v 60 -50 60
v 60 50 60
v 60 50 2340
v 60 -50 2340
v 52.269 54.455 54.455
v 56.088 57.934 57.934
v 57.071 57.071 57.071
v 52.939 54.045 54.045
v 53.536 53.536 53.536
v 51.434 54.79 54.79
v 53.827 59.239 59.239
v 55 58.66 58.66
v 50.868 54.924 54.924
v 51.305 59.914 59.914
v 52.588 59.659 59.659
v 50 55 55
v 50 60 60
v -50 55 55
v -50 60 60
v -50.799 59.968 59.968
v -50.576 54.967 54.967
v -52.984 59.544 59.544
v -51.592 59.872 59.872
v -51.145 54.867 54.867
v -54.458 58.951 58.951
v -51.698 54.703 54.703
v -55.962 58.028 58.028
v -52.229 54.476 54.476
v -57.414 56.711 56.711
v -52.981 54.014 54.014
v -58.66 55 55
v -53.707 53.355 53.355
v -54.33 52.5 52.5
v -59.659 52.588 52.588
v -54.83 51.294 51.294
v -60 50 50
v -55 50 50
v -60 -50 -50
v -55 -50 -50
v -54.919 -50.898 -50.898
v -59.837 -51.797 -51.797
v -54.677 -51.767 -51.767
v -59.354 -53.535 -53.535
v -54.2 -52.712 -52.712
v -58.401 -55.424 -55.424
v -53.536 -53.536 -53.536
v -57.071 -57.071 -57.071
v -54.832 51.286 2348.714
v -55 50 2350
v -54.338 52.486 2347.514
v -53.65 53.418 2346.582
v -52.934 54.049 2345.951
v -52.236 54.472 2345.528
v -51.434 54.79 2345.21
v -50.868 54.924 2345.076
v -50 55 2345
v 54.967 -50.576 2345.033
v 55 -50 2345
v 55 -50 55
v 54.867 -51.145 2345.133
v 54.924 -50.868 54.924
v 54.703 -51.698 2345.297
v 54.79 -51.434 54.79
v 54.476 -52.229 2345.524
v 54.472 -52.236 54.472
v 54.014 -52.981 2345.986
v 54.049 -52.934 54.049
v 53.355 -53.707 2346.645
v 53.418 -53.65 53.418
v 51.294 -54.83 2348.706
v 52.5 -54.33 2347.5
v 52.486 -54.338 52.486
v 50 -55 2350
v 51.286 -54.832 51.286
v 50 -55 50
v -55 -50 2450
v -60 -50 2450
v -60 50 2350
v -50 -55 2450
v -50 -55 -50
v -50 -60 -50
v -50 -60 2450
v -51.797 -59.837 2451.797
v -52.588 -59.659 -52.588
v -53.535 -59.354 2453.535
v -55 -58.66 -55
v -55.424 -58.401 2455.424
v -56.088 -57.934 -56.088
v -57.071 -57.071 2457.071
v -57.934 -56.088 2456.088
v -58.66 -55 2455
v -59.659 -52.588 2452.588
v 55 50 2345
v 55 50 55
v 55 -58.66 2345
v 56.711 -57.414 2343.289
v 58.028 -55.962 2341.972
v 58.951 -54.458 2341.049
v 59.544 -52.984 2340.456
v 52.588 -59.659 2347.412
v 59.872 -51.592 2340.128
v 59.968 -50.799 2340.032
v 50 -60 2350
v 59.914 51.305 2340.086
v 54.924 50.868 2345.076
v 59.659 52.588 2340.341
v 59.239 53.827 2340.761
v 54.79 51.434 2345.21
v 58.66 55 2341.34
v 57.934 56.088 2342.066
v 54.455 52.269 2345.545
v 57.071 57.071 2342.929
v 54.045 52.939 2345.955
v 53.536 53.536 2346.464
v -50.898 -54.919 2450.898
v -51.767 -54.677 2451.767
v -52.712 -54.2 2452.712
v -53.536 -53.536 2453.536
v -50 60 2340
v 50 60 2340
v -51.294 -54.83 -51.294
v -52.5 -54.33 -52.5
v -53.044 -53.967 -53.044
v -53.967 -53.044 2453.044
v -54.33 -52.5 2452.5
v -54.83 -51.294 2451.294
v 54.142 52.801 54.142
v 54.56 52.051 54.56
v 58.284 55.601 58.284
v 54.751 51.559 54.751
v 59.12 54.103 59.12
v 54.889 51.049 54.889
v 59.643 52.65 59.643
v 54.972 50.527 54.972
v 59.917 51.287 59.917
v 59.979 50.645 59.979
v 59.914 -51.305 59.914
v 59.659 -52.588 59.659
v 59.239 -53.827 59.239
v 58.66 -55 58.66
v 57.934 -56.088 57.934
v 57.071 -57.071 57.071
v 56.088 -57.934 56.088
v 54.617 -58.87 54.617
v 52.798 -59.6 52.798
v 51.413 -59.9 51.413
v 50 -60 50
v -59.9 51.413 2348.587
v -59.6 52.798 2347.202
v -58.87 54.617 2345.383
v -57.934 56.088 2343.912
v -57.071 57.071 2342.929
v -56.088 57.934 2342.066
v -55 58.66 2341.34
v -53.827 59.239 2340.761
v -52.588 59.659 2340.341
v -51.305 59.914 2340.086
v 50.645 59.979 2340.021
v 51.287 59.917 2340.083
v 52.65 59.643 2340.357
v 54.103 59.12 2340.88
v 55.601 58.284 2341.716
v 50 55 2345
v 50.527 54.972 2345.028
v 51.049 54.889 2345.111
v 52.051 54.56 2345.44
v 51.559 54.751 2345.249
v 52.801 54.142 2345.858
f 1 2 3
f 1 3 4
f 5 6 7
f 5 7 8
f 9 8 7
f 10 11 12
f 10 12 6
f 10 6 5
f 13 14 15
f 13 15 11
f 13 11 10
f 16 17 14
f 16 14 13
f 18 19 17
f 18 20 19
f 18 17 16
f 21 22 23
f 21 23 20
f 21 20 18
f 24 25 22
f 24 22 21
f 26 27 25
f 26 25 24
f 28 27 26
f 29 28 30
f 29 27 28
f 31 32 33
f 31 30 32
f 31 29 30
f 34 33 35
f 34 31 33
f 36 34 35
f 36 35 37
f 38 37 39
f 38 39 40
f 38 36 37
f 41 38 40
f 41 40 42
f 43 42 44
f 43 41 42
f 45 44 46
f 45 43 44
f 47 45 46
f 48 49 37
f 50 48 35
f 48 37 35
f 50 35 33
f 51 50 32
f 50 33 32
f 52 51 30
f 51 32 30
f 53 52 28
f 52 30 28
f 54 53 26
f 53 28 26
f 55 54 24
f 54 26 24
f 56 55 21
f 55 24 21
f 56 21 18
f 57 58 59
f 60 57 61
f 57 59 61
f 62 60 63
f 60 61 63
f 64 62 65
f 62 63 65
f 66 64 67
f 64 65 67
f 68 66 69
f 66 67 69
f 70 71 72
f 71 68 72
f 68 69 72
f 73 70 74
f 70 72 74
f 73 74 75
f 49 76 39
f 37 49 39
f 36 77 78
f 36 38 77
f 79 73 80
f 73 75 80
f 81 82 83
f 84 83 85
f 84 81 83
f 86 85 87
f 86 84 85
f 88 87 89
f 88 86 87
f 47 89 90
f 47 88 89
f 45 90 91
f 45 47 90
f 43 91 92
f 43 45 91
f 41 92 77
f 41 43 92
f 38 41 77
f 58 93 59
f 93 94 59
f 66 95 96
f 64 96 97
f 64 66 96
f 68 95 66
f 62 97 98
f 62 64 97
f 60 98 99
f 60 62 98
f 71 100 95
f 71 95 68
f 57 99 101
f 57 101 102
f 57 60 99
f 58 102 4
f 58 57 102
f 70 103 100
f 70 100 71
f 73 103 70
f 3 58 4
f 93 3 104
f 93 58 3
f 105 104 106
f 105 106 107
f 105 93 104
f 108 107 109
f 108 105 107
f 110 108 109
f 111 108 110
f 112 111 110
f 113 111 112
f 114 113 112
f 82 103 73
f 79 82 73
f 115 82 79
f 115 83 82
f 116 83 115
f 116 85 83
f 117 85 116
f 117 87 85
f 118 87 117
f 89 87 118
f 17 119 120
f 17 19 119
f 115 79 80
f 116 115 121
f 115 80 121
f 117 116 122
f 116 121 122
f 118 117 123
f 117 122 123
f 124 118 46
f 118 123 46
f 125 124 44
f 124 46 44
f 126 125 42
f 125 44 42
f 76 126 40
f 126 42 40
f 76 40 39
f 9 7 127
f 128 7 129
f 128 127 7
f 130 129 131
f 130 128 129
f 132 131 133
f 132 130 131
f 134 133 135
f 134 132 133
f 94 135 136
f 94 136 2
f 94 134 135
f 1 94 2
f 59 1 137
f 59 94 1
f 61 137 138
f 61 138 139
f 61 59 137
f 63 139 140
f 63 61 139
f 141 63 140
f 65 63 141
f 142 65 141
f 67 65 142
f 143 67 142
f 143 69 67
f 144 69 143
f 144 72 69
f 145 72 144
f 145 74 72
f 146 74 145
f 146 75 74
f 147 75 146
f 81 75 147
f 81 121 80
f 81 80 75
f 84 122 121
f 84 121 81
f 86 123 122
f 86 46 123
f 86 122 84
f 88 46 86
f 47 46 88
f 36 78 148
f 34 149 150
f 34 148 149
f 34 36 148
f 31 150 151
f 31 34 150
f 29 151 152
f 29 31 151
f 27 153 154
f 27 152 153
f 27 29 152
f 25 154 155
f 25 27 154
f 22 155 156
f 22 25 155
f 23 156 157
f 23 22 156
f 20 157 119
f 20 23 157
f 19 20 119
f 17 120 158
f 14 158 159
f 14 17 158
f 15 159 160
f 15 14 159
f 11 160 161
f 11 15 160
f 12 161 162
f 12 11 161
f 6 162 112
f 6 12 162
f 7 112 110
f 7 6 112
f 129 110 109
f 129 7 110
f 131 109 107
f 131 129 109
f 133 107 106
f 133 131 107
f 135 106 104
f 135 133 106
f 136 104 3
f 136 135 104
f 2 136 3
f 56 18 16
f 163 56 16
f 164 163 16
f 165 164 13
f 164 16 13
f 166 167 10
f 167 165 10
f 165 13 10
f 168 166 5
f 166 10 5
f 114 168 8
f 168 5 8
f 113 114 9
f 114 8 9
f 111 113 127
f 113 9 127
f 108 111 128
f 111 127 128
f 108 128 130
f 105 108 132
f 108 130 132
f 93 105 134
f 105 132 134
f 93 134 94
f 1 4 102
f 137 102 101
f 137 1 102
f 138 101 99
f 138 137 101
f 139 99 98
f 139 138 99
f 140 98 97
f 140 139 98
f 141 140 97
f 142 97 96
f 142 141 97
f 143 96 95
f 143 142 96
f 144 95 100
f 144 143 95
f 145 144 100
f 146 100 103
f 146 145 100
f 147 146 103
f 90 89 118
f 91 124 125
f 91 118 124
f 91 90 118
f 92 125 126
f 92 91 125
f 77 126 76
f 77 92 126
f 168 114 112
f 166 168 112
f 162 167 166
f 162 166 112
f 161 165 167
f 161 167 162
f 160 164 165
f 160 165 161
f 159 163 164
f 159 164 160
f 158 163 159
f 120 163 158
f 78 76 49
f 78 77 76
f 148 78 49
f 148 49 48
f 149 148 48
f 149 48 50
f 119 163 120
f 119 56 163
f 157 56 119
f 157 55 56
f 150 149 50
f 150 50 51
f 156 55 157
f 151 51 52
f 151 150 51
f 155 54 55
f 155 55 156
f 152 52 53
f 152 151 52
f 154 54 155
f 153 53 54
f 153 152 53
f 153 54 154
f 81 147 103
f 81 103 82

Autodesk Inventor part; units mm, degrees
ref_plane "Start Plane" through (0, 0, -57.0711) normal (0, 0, 1) x (1, 0, 0)
ref_plane "End Plane" through (0, 0, 2457.0711) normal (0, 0, 1) x (1, 0, 0)
sketch "Sketch" plane through (0, 0, 0) normal (0, 0, 1) x (1, 0, 0)
  line L0 (-60, -50) -> (-60, 50)
  line L1 (-50, 60) -> (50, 60)
  line L2 (60, 50) -> (60, -50)
  line L3 (50, -60) -> (-50, -60)
  arc A0 (-60, -50) -> (-50, -60) centre (-50, -50) ccw
  arc A1 (60, 50) -> (50, 60) centre (50, 50) ccw
  arc A2 (-50, 60) -> (-60, 50) centre (-50, 50) ccw
  arc A3 (50, -60) -> (60, -50) centre (50, -50) ccw
  arc A4 (-50, 55) -> (-55, 50) centre (-50, 50) ccw
  line L4 (-50, 55) -> (50, 55)
  arc A5 (55, 50) -> (50, 55) centre (50, 50) ccw
  line L5 (55, 50) -> (55, -50)
  arc A6 (50, -55) -> (55, -50) centre (50, -50) ccw
  line L6 (50, -55) -> (-50, -55)
  arc A7 (-55, -50) -> (-50, -55) centre (-50, -50) ccw
  line L7 (-55, -50) -> (-55, 50)
  line L8 (0, 86.8995) -> (0, -86.8995) construction
  line L9 (-86.8995, 0) -> (86.8995, 0) construction
  dimension "d7" = 10
  dimension "d9" = 120
  dimension "d11" = 120
  dimension "d12" = 5
  dimension "d15" = 60
  dimension "d16" = 60
extrude "Body" add sketch "Sketch" along normal up to surface (2514.1421 mm away) from surface at -57.0711
sketch "Sketch3" plane through (0, 0, 0) normal (0, 0, 1) x (1, 0, 0)
  line L0 (0, 0) -> (10, 0)
ref_plane "Work Plane3" through (0, 0, 0) normal (0, -1, 0) x (1, 0, 0)
ref_plane "Work Plane4" through (-60, 0, 2460) normal (0.7071, 0, 0.7071) x (0.7071, 0, -0.7071)
split "Split1" plane through (-60, 0, 2460) removes the side toward (0.7071, 0, 0.7071)
ref_plane "Work Plane5" through (0, -60, 2460) normal (0, 0.7071, 0.7071) x (1, 0, 0)
split "Split2" plane through (0, -60, 2460) removes the side toward (0, 0.7071, 0.7071)
ref_plane "Work Plane6" through (0, -60, -60) normal (0, 0.7071, -0.7071) x (1, 0, 0)
split "Split3" plane through (0, -60, -60) removes the side toward (0, 0.7071, -0.7071)
ref_plane "Work Plane7" through (-60, 0, -60) normal (0.7071, 0, -0.7071) x (-0.7071, 0, -0.7071)
split "Split4" plane through (-60, 0, -60) removes the side toward (0.7071, 0, -0.7071)
sketch "Sketch4" plane through (0, 0, 0) normal (0, -1, 0) x (1, 0, 0)
  line L0 (-2, -57.0711) -> (12, -57.0711) projected
  line L1 (-2, 2457.0711) -> (12, 2457.0711) projected
  dimension "d18" = 2514.1421
equation "\"d7\" = G_IR"
equation "\"d9\" = G_W"
equation "\"d11\" = G_H"
equation "\"d12\" = G_T"
equation "\"d15\" = 0.5 * d9"
equation "\"d16\" = 0.5 * d11"
equation "\"d3\" = G_L"
equation "\"G_W\" = 120"
equation "\"G_H\" = 120"
equation "\"G_T\" = 5"
equation "\"G_IR\" = 10"
equation "\"G_L\" = d18"
equation "\"G_OFFSET_START\" = 57.07107"
equation "\"G_OFFSET_END\" = 57.07107"
equation "\"d13\" = -G_OFFSET_START"
equation "\"d14\" = G_OFFSET_END + B_L"
equation "\"B_L\" = 2400"
properties part number "ISO 10799-2 - 120x120x5 - 2514,14" material "Steel, Mild"
